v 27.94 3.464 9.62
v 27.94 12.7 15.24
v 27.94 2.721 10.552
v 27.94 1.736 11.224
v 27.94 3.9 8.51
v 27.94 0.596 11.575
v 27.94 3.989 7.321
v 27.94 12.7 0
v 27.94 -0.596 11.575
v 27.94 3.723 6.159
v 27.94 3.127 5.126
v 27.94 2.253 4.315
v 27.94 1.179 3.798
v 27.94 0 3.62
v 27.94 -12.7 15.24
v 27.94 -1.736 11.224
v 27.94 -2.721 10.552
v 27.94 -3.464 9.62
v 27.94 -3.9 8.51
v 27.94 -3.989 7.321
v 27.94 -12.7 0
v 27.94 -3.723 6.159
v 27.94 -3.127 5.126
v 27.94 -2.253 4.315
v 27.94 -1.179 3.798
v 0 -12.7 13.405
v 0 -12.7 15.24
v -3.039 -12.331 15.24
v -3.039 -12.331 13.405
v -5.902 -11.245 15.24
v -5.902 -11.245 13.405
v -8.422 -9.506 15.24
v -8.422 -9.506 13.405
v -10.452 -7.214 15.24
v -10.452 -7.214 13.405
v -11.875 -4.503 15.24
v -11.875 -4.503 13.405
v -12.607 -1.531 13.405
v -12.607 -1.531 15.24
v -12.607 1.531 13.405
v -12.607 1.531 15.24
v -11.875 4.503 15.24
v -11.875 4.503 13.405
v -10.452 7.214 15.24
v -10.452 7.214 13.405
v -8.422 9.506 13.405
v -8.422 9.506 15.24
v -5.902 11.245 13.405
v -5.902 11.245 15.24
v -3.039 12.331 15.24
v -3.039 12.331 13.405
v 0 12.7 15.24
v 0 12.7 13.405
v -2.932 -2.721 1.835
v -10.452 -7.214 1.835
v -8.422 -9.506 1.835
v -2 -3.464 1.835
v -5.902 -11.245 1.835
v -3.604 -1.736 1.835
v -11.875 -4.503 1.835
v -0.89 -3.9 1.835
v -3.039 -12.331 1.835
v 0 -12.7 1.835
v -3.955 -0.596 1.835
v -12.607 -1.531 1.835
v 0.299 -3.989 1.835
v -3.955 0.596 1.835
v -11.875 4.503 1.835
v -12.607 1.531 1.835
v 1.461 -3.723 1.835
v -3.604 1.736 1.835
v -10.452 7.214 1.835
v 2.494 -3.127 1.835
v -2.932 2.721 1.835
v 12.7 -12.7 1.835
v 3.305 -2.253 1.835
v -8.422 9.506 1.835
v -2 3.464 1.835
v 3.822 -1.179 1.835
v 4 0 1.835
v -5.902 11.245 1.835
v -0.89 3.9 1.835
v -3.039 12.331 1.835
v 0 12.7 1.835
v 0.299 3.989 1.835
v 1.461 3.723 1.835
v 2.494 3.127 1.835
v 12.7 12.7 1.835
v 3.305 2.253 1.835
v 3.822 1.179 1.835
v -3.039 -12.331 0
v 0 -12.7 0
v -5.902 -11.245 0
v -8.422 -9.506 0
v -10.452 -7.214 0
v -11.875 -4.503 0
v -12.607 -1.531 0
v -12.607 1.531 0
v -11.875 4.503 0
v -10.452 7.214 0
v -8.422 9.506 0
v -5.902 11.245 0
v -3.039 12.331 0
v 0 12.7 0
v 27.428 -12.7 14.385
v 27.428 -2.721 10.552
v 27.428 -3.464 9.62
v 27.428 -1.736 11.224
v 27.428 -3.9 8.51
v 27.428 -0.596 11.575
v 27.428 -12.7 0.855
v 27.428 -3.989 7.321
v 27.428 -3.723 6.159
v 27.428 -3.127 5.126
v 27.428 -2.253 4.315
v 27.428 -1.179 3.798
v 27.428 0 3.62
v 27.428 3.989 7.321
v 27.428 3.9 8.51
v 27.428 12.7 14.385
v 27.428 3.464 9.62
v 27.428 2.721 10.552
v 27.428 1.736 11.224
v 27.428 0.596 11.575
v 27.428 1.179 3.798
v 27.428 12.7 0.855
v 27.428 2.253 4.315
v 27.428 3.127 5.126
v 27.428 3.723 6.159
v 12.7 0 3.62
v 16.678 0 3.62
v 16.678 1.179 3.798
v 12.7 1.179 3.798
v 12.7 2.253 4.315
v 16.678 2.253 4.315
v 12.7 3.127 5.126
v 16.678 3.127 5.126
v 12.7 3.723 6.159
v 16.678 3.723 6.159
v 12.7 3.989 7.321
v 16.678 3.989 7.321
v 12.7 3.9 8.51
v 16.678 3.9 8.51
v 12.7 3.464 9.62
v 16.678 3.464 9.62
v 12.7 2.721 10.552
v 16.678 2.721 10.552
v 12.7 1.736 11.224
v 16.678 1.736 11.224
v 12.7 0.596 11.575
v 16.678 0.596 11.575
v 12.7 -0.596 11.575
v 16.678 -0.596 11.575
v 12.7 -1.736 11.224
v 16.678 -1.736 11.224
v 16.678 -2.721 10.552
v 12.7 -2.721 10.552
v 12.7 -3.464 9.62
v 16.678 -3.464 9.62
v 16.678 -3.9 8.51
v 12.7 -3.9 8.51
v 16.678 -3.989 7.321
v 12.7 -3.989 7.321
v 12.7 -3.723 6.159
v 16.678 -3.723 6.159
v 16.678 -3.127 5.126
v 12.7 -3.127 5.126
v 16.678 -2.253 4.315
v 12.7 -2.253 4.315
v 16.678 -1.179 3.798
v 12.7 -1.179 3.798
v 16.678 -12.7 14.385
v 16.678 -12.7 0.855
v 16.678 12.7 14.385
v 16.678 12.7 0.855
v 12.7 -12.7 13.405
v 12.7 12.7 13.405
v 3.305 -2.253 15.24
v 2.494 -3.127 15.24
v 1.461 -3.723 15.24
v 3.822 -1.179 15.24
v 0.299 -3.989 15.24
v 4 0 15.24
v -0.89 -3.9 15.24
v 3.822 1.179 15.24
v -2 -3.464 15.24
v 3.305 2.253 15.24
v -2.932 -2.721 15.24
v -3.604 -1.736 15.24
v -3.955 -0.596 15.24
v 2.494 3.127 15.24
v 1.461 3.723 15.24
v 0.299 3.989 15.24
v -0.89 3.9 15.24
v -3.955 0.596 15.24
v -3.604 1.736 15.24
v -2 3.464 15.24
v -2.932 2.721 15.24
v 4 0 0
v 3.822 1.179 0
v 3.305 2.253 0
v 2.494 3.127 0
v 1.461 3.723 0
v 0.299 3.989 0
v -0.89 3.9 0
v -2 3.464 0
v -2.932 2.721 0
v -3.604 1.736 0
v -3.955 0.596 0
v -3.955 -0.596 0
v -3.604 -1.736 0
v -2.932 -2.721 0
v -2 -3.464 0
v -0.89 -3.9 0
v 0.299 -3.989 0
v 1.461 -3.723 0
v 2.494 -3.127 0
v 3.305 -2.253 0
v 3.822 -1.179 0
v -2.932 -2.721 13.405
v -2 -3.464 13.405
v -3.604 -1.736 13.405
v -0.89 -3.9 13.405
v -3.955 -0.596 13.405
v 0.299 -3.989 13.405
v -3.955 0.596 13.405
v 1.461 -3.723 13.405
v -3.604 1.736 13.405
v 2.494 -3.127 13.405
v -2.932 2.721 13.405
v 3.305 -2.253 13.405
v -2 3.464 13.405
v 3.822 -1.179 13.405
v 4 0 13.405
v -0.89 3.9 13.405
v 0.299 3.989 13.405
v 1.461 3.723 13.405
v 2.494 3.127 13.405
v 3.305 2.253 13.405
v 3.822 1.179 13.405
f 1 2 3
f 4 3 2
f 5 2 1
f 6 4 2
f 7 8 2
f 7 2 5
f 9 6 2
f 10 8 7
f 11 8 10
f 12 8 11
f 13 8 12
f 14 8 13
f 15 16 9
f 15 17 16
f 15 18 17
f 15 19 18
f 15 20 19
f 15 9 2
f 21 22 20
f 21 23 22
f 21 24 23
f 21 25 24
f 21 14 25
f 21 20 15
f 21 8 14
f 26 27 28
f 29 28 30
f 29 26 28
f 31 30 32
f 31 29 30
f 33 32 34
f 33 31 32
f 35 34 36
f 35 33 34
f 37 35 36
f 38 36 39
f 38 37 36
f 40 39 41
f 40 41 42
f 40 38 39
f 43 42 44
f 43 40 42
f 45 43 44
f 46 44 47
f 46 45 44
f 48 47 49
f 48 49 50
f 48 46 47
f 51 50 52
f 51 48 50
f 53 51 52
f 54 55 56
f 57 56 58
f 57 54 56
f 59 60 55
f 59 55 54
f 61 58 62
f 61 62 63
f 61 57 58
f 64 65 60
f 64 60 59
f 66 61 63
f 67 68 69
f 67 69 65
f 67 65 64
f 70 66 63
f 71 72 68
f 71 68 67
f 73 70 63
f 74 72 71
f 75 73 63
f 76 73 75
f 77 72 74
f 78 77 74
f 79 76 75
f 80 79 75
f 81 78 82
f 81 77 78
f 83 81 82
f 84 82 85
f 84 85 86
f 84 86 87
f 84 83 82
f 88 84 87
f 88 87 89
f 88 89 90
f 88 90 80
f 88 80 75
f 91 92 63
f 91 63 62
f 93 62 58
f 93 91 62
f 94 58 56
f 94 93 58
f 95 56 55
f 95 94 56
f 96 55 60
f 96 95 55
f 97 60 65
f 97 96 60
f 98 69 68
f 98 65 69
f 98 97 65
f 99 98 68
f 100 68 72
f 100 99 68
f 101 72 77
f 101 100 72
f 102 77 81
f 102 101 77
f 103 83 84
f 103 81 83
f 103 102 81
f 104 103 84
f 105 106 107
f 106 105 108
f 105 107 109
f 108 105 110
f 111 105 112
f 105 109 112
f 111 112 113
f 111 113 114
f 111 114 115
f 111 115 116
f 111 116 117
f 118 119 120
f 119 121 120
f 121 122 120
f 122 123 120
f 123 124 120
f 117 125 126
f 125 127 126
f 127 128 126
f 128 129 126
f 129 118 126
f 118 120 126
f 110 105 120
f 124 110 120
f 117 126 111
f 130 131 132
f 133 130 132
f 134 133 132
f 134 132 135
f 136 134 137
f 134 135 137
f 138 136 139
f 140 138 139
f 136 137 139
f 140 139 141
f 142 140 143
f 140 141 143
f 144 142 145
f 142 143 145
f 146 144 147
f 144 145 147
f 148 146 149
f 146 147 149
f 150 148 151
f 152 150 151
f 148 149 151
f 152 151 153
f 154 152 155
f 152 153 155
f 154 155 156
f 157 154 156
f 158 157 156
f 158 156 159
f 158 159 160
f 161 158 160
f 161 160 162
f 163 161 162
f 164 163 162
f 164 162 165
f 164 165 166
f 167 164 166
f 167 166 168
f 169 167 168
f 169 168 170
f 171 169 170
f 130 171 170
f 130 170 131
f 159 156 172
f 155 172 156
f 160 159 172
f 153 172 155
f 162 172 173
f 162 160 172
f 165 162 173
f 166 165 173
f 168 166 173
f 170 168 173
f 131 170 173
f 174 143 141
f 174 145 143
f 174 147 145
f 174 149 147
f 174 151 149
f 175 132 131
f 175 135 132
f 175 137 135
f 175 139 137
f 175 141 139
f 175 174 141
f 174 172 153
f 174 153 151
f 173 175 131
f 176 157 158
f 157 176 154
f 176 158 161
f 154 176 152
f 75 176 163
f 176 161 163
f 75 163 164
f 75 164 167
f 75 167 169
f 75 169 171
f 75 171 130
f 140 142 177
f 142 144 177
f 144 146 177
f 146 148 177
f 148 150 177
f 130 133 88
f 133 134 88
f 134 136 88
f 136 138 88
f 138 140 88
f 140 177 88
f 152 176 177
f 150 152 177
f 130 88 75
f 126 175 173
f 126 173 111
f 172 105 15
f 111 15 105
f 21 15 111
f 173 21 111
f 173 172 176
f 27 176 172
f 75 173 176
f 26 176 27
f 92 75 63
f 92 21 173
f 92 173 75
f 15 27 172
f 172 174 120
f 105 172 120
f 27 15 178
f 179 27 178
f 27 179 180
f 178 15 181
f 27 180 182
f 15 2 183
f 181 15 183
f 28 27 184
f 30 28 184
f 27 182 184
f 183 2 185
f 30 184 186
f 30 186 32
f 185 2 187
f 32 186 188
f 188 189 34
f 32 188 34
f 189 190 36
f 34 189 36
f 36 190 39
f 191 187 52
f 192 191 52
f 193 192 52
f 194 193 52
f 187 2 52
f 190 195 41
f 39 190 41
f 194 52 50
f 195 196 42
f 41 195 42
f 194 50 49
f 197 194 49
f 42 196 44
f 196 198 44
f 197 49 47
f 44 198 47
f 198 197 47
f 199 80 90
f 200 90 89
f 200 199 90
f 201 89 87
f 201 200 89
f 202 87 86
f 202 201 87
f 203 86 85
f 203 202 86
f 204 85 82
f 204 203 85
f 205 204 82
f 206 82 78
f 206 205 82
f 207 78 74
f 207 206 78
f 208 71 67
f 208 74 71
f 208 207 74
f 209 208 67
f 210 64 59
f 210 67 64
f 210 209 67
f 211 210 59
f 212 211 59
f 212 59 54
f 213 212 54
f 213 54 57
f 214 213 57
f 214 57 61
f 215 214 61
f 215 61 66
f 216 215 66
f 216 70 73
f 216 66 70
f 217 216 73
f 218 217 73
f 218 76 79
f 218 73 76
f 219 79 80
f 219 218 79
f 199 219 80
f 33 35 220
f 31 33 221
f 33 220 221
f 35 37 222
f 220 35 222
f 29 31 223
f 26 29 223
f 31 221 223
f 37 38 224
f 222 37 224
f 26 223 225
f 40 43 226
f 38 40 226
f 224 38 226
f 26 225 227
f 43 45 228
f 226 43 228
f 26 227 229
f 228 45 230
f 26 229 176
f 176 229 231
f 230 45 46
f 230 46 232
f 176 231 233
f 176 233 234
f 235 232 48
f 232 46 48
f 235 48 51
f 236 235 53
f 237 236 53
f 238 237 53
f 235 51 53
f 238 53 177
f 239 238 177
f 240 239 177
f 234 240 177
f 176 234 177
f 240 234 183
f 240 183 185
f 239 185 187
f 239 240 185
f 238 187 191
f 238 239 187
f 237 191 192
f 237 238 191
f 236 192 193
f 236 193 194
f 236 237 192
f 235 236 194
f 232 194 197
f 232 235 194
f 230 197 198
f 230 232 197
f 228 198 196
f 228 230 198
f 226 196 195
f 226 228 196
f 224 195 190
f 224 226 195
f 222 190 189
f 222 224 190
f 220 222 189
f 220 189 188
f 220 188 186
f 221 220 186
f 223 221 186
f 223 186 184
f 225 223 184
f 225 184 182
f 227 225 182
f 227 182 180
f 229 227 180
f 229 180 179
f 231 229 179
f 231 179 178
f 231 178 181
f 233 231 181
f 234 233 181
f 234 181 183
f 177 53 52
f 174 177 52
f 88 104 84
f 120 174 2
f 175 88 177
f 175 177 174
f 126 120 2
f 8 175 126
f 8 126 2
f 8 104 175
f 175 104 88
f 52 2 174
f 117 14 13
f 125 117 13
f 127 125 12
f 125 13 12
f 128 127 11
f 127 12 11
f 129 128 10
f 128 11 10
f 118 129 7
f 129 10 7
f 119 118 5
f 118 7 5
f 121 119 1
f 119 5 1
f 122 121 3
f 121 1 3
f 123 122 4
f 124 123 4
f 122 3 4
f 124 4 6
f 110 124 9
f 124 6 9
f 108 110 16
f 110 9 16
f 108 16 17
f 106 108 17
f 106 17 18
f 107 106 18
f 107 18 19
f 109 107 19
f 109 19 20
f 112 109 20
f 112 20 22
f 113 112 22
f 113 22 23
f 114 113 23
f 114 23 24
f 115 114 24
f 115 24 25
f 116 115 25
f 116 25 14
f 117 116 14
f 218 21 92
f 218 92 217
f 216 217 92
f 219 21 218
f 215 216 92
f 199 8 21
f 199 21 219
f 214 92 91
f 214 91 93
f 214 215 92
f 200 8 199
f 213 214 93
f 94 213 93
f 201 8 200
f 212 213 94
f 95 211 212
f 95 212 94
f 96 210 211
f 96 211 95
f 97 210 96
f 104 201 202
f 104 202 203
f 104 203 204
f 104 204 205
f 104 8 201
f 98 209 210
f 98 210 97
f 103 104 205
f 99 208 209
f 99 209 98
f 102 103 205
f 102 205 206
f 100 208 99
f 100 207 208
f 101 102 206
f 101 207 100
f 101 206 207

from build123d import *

# Parameters (mm, degrees)
SKETCH1_R           = 4
BOSS_EXTRUDE1_DEPTH = 15.24
SKETCH2_W           = 25.4
SKETCH2_H           = 11.5697
CUT_EXTRUDE1_DEPTH  = 26.4
SKETCH3_W           = 10.75005279
SKETCH3_H           = 13.530974344
CUT_EXTRUDE2_DEPTH  = 26.4
SKETCH4_R           = 4
CUT_EXTRUDE3_DEPTH  = 41.64


with BuildPart() as part:
    # Sketch1 → Boss-Extrude1 (new body)
    with BuildSketch(Plane.XY):
        with BuildLine():
            Line((0, 12.7), (27.94, 12.7))
            Line((27.94, 12.7), (27.94, -12.7))
            Line((27.94, -12.7), (0, -12.7))
            ThreePointArc((0, -12.7), (-12.7, 0), (0, 12.7))
        make_face()
        Circle(SKETCH1_R, mode=Mode.SUBTRACT)
    extrude(amount=BOSS_EXTRUDE1_DEPTH)

    # Sketch2 → Cut-Extrude1 (cut, through all)
    with BuildSketch(Plane(origin=(0, 12.7, 0), x_dir=(1, 0, 0), z_dir=(0, 1, 0))):
        with Locations((0, -7.62)):
            Rectangle(SKETCH2_W, SKETCH2_H)
    extrude(amount=-CUT_EXTRUDE1_DEPTH, mode=Mode.SUBTRACT)

    # Sketch3 → Cut-Extrude2 (cut, through all)
    with BuildSketch(Plane(origin=(0, 12.7, 0), x_dir=(1, 0, 0), z_dir=(0, 1, 0))):
        with Locations((22.053049583, -7.62)):
            Rectangle(SKETCH3_W, SKETCH3_H)
    extrude(amount=-CUT_EXTRUDE2_DEPTH, mode=Mode.SUBTRACT)

    # Sketch4 → Cut-Extrude3 (cut, through all)
    with BuildSketch(Plane(origin=(27.94, 0, 0), x_dir=(0, 0, -1), z_dir=(1, 0, 0))):
        with Locations((-7.62, 0)):
            Circle(SKETCH4_R)
    extrude(amount=-CUT_EXTRUDE3_DEPTH, mode=Mode.SUBTRACT)


solid = part.part
